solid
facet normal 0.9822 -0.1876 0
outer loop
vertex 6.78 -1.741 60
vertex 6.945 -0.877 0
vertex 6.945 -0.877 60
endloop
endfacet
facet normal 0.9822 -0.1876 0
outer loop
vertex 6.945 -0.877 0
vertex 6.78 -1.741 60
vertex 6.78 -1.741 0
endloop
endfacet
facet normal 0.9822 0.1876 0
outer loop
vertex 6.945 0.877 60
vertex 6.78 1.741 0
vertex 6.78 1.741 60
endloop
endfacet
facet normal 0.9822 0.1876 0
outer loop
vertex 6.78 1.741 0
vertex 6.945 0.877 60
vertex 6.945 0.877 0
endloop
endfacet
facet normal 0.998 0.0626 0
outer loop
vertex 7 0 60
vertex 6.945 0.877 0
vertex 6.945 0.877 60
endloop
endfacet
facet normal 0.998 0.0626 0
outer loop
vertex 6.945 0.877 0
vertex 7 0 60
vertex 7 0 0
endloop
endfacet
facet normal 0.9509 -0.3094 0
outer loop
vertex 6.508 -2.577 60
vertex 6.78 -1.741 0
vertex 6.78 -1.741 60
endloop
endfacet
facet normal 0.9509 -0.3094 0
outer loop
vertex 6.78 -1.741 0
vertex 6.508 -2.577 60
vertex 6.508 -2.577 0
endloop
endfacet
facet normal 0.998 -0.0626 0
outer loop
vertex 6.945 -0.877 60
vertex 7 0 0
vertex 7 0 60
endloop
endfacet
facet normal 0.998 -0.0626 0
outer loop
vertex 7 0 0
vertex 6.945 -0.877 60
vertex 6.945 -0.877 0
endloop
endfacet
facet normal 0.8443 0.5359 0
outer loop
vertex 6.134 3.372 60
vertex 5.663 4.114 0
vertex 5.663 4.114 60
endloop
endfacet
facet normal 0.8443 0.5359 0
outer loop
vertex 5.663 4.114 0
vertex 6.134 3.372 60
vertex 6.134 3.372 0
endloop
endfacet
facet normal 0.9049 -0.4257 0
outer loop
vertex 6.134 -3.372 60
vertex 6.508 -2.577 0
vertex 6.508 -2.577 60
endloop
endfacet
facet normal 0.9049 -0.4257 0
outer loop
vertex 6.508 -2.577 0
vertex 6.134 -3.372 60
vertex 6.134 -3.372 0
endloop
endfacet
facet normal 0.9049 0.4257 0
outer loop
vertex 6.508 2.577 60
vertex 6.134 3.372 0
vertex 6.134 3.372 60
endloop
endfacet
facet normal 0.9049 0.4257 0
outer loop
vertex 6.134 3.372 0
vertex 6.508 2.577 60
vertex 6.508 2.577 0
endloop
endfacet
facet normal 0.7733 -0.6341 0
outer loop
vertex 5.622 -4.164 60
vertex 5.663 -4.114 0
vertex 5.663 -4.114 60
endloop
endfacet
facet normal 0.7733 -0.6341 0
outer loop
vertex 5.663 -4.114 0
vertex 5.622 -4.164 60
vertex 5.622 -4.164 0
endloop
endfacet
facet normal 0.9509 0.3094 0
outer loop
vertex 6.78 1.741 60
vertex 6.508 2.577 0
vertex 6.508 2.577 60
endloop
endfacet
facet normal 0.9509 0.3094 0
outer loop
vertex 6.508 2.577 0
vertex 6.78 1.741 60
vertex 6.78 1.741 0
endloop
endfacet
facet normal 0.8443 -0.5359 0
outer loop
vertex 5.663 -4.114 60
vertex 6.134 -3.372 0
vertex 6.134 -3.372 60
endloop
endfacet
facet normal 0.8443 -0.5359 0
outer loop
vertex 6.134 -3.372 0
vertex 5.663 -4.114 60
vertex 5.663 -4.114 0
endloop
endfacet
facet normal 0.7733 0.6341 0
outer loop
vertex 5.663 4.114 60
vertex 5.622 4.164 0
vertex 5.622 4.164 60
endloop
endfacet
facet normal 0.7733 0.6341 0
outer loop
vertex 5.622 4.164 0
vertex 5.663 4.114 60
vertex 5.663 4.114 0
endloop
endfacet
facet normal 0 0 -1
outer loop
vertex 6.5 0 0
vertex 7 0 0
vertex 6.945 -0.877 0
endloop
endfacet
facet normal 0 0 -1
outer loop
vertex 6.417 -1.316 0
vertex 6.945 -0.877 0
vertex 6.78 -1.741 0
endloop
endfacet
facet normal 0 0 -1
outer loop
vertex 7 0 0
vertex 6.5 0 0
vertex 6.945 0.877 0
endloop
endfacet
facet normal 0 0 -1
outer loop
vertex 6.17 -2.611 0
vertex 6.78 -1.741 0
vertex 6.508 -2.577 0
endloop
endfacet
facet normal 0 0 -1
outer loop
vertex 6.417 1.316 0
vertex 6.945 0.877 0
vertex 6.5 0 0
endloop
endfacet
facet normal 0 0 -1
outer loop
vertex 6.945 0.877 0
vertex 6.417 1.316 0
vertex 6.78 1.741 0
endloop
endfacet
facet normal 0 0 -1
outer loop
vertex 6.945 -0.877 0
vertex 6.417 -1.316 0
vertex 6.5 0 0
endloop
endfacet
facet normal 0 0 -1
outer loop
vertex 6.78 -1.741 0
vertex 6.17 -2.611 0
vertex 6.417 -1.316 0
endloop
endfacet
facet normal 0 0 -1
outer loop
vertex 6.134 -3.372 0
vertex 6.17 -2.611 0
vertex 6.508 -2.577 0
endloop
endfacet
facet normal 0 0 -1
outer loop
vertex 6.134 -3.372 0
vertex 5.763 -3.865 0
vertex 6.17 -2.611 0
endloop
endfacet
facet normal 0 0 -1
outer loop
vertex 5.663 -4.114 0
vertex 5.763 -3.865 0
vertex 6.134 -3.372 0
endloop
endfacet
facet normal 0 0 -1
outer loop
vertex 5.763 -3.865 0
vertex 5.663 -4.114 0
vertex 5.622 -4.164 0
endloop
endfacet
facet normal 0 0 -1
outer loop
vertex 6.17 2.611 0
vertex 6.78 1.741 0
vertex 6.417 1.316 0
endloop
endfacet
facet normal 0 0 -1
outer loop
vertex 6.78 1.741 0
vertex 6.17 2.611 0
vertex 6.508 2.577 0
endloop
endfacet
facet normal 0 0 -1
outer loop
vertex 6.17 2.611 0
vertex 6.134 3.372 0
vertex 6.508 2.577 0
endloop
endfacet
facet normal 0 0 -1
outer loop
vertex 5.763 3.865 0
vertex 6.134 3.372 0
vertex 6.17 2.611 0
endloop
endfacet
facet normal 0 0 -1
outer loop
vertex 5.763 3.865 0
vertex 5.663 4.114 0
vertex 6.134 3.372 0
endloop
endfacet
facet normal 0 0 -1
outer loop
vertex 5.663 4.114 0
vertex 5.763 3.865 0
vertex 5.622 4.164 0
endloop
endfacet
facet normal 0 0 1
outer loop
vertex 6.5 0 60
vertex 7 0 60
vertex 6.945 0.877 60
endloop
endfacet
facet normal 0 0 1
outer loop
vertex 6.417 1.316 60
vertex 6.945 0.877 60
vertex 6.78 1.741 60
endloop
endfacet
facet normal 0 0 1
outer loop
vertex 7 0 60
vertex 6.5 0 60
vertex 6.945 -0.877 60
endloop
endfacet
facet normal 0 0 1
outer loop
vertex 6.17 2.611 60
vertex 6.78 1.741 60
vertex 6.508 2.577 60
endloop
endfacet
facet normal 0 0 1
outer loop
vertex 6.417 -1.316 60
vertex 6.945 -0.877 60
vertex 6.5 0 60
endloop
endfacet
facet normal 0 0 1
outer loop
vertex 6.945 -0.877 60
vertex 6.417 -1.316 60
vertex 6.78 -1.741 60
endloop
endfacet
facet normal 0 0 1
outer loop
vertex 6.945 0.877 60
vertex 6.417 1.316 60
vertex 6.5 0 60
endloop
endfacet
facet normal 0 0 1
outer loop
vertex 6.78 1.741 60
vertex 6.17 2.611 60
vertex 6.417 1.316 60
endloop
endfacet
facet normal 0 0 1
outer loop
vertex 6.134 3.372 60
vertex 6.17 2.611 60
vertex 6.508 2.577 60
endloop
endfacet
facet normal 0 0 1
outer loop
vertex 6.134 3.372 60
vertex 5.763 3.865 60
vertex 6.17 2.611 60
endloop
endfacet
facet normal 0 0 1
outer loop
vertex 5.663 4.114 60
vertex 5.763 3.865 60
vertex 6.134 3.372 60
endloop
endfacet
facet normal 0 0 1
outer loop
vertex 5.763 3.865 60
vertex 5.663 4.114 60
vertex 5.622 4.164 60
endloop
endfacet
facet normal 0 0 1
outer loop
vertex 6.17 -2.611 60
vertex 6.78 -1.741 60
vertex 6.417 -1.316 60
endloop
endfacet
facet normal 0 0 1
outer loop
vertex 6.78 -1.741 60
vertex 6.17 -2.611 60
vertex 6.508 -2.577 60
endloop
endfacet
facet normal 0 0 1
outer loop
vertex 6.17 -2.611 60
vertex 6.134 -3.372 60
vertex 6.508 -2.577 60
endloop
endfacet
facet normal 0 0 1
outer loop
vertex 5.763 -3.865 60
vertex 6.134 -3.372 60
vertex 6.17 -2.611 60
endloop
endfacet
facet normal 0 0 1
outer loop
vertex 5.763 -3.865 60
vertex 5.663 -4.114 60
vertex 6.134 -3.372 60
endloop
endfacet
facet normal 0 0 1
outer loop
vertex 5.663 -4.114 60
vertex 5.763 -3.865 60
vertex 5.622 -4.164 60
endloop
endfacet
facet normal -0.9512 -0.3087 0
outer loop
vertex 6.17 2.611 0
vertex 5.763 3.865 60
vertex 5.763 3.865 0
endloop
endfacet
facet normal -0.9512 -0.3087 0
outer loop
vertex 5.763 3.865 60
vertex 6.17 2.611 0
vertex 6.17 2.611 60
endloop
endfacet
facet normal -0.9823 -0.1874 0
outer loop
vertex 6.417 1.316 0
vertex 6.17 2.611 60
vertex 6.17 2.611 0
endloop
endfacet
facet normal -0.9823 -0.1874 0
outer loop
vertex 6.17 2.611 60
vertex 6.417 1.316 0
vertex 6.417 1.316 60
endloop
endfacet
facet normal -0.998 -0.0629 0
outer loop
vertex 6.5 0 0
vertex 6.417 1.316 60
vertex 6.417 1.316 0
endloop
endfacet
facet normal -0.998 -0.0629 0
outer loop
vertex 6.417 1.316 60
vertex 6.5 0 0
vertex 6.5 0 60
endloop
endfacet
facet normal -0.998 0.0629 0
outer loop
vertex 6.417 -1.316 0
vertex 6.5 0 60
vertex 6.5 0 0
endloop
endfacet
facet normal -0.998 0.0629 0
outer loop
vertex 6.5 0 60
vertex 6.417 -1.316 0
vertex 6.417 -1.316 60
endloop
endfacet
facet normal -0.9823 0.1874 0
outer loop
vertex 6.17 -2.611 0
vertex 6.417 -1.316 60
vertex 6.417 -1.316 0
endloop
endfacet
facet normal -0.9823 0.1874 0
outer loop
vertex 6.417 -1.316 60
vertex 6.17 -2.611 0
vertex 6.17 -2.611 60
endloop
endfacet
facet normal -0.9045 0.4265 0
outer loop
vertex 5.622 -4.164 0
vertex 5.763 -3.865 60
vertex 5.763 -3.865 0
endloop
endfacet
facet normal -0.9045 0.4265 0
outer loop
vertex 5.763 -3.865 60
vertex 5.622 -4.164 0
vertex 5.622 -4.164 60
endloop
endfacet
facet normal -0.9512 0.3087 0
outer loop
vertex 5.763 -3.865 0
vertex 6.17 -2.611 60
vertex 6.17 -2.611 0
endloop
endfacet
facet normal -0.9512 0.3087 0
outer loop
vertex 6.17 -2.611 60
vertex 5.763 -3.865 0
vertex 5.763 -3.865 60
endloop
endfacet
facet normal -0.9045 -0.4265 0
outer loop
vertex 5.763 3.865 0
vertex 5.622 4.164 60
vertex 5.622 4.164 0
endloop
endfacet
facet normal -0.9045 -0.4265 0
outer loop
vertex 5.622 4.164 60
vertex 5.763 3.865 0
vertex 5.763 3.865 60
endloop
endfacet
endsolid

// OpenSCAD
$fn = 50;


difference() {
	union() {
		cylinder(h = 60, r = 7.0000000000);
		translate(v = [-7.0000000000, 0, 0]) {
			cylinder(h = 60, r = 7.0000000000);
		}
	}
	union() {
		cylinder(h = 60, r = 3.2500000000);
		cylinder(h = 60, r = 1.8000000000);
		cylinder(h = 60, r = 1.8000000000);
		cylinder(h = 60, r = 1.8000000000);
		translate(v = [-11.5000000000, 0, 0]) {
			hull() {
				translate(v = [-3.7500000000, 0.0000000000, 0]) {
					cylinder(h = 60, r = 10.5000000000);
				}
				translate(v = [3.7500000000, 0.0000000000, 0]) {
					cylinder(h = 60, r = 10.5000000000);
				}
				translate(v = [-3.7500000000, -0.0000000000, 0]) {
					cylinder(h = 60, r = 10.5000000000);
				}
				translate(v = [3.7500000000, -0.0000000000, 0]) {
					cylinder(h = 60, r = 10.5000000000);
				}
			}
		}
		translate(v = [-4.0000000000, 0, 0.0000000000]) {
			cylinder(h = 60, r = 10.5000000000);
		}
	}
}
